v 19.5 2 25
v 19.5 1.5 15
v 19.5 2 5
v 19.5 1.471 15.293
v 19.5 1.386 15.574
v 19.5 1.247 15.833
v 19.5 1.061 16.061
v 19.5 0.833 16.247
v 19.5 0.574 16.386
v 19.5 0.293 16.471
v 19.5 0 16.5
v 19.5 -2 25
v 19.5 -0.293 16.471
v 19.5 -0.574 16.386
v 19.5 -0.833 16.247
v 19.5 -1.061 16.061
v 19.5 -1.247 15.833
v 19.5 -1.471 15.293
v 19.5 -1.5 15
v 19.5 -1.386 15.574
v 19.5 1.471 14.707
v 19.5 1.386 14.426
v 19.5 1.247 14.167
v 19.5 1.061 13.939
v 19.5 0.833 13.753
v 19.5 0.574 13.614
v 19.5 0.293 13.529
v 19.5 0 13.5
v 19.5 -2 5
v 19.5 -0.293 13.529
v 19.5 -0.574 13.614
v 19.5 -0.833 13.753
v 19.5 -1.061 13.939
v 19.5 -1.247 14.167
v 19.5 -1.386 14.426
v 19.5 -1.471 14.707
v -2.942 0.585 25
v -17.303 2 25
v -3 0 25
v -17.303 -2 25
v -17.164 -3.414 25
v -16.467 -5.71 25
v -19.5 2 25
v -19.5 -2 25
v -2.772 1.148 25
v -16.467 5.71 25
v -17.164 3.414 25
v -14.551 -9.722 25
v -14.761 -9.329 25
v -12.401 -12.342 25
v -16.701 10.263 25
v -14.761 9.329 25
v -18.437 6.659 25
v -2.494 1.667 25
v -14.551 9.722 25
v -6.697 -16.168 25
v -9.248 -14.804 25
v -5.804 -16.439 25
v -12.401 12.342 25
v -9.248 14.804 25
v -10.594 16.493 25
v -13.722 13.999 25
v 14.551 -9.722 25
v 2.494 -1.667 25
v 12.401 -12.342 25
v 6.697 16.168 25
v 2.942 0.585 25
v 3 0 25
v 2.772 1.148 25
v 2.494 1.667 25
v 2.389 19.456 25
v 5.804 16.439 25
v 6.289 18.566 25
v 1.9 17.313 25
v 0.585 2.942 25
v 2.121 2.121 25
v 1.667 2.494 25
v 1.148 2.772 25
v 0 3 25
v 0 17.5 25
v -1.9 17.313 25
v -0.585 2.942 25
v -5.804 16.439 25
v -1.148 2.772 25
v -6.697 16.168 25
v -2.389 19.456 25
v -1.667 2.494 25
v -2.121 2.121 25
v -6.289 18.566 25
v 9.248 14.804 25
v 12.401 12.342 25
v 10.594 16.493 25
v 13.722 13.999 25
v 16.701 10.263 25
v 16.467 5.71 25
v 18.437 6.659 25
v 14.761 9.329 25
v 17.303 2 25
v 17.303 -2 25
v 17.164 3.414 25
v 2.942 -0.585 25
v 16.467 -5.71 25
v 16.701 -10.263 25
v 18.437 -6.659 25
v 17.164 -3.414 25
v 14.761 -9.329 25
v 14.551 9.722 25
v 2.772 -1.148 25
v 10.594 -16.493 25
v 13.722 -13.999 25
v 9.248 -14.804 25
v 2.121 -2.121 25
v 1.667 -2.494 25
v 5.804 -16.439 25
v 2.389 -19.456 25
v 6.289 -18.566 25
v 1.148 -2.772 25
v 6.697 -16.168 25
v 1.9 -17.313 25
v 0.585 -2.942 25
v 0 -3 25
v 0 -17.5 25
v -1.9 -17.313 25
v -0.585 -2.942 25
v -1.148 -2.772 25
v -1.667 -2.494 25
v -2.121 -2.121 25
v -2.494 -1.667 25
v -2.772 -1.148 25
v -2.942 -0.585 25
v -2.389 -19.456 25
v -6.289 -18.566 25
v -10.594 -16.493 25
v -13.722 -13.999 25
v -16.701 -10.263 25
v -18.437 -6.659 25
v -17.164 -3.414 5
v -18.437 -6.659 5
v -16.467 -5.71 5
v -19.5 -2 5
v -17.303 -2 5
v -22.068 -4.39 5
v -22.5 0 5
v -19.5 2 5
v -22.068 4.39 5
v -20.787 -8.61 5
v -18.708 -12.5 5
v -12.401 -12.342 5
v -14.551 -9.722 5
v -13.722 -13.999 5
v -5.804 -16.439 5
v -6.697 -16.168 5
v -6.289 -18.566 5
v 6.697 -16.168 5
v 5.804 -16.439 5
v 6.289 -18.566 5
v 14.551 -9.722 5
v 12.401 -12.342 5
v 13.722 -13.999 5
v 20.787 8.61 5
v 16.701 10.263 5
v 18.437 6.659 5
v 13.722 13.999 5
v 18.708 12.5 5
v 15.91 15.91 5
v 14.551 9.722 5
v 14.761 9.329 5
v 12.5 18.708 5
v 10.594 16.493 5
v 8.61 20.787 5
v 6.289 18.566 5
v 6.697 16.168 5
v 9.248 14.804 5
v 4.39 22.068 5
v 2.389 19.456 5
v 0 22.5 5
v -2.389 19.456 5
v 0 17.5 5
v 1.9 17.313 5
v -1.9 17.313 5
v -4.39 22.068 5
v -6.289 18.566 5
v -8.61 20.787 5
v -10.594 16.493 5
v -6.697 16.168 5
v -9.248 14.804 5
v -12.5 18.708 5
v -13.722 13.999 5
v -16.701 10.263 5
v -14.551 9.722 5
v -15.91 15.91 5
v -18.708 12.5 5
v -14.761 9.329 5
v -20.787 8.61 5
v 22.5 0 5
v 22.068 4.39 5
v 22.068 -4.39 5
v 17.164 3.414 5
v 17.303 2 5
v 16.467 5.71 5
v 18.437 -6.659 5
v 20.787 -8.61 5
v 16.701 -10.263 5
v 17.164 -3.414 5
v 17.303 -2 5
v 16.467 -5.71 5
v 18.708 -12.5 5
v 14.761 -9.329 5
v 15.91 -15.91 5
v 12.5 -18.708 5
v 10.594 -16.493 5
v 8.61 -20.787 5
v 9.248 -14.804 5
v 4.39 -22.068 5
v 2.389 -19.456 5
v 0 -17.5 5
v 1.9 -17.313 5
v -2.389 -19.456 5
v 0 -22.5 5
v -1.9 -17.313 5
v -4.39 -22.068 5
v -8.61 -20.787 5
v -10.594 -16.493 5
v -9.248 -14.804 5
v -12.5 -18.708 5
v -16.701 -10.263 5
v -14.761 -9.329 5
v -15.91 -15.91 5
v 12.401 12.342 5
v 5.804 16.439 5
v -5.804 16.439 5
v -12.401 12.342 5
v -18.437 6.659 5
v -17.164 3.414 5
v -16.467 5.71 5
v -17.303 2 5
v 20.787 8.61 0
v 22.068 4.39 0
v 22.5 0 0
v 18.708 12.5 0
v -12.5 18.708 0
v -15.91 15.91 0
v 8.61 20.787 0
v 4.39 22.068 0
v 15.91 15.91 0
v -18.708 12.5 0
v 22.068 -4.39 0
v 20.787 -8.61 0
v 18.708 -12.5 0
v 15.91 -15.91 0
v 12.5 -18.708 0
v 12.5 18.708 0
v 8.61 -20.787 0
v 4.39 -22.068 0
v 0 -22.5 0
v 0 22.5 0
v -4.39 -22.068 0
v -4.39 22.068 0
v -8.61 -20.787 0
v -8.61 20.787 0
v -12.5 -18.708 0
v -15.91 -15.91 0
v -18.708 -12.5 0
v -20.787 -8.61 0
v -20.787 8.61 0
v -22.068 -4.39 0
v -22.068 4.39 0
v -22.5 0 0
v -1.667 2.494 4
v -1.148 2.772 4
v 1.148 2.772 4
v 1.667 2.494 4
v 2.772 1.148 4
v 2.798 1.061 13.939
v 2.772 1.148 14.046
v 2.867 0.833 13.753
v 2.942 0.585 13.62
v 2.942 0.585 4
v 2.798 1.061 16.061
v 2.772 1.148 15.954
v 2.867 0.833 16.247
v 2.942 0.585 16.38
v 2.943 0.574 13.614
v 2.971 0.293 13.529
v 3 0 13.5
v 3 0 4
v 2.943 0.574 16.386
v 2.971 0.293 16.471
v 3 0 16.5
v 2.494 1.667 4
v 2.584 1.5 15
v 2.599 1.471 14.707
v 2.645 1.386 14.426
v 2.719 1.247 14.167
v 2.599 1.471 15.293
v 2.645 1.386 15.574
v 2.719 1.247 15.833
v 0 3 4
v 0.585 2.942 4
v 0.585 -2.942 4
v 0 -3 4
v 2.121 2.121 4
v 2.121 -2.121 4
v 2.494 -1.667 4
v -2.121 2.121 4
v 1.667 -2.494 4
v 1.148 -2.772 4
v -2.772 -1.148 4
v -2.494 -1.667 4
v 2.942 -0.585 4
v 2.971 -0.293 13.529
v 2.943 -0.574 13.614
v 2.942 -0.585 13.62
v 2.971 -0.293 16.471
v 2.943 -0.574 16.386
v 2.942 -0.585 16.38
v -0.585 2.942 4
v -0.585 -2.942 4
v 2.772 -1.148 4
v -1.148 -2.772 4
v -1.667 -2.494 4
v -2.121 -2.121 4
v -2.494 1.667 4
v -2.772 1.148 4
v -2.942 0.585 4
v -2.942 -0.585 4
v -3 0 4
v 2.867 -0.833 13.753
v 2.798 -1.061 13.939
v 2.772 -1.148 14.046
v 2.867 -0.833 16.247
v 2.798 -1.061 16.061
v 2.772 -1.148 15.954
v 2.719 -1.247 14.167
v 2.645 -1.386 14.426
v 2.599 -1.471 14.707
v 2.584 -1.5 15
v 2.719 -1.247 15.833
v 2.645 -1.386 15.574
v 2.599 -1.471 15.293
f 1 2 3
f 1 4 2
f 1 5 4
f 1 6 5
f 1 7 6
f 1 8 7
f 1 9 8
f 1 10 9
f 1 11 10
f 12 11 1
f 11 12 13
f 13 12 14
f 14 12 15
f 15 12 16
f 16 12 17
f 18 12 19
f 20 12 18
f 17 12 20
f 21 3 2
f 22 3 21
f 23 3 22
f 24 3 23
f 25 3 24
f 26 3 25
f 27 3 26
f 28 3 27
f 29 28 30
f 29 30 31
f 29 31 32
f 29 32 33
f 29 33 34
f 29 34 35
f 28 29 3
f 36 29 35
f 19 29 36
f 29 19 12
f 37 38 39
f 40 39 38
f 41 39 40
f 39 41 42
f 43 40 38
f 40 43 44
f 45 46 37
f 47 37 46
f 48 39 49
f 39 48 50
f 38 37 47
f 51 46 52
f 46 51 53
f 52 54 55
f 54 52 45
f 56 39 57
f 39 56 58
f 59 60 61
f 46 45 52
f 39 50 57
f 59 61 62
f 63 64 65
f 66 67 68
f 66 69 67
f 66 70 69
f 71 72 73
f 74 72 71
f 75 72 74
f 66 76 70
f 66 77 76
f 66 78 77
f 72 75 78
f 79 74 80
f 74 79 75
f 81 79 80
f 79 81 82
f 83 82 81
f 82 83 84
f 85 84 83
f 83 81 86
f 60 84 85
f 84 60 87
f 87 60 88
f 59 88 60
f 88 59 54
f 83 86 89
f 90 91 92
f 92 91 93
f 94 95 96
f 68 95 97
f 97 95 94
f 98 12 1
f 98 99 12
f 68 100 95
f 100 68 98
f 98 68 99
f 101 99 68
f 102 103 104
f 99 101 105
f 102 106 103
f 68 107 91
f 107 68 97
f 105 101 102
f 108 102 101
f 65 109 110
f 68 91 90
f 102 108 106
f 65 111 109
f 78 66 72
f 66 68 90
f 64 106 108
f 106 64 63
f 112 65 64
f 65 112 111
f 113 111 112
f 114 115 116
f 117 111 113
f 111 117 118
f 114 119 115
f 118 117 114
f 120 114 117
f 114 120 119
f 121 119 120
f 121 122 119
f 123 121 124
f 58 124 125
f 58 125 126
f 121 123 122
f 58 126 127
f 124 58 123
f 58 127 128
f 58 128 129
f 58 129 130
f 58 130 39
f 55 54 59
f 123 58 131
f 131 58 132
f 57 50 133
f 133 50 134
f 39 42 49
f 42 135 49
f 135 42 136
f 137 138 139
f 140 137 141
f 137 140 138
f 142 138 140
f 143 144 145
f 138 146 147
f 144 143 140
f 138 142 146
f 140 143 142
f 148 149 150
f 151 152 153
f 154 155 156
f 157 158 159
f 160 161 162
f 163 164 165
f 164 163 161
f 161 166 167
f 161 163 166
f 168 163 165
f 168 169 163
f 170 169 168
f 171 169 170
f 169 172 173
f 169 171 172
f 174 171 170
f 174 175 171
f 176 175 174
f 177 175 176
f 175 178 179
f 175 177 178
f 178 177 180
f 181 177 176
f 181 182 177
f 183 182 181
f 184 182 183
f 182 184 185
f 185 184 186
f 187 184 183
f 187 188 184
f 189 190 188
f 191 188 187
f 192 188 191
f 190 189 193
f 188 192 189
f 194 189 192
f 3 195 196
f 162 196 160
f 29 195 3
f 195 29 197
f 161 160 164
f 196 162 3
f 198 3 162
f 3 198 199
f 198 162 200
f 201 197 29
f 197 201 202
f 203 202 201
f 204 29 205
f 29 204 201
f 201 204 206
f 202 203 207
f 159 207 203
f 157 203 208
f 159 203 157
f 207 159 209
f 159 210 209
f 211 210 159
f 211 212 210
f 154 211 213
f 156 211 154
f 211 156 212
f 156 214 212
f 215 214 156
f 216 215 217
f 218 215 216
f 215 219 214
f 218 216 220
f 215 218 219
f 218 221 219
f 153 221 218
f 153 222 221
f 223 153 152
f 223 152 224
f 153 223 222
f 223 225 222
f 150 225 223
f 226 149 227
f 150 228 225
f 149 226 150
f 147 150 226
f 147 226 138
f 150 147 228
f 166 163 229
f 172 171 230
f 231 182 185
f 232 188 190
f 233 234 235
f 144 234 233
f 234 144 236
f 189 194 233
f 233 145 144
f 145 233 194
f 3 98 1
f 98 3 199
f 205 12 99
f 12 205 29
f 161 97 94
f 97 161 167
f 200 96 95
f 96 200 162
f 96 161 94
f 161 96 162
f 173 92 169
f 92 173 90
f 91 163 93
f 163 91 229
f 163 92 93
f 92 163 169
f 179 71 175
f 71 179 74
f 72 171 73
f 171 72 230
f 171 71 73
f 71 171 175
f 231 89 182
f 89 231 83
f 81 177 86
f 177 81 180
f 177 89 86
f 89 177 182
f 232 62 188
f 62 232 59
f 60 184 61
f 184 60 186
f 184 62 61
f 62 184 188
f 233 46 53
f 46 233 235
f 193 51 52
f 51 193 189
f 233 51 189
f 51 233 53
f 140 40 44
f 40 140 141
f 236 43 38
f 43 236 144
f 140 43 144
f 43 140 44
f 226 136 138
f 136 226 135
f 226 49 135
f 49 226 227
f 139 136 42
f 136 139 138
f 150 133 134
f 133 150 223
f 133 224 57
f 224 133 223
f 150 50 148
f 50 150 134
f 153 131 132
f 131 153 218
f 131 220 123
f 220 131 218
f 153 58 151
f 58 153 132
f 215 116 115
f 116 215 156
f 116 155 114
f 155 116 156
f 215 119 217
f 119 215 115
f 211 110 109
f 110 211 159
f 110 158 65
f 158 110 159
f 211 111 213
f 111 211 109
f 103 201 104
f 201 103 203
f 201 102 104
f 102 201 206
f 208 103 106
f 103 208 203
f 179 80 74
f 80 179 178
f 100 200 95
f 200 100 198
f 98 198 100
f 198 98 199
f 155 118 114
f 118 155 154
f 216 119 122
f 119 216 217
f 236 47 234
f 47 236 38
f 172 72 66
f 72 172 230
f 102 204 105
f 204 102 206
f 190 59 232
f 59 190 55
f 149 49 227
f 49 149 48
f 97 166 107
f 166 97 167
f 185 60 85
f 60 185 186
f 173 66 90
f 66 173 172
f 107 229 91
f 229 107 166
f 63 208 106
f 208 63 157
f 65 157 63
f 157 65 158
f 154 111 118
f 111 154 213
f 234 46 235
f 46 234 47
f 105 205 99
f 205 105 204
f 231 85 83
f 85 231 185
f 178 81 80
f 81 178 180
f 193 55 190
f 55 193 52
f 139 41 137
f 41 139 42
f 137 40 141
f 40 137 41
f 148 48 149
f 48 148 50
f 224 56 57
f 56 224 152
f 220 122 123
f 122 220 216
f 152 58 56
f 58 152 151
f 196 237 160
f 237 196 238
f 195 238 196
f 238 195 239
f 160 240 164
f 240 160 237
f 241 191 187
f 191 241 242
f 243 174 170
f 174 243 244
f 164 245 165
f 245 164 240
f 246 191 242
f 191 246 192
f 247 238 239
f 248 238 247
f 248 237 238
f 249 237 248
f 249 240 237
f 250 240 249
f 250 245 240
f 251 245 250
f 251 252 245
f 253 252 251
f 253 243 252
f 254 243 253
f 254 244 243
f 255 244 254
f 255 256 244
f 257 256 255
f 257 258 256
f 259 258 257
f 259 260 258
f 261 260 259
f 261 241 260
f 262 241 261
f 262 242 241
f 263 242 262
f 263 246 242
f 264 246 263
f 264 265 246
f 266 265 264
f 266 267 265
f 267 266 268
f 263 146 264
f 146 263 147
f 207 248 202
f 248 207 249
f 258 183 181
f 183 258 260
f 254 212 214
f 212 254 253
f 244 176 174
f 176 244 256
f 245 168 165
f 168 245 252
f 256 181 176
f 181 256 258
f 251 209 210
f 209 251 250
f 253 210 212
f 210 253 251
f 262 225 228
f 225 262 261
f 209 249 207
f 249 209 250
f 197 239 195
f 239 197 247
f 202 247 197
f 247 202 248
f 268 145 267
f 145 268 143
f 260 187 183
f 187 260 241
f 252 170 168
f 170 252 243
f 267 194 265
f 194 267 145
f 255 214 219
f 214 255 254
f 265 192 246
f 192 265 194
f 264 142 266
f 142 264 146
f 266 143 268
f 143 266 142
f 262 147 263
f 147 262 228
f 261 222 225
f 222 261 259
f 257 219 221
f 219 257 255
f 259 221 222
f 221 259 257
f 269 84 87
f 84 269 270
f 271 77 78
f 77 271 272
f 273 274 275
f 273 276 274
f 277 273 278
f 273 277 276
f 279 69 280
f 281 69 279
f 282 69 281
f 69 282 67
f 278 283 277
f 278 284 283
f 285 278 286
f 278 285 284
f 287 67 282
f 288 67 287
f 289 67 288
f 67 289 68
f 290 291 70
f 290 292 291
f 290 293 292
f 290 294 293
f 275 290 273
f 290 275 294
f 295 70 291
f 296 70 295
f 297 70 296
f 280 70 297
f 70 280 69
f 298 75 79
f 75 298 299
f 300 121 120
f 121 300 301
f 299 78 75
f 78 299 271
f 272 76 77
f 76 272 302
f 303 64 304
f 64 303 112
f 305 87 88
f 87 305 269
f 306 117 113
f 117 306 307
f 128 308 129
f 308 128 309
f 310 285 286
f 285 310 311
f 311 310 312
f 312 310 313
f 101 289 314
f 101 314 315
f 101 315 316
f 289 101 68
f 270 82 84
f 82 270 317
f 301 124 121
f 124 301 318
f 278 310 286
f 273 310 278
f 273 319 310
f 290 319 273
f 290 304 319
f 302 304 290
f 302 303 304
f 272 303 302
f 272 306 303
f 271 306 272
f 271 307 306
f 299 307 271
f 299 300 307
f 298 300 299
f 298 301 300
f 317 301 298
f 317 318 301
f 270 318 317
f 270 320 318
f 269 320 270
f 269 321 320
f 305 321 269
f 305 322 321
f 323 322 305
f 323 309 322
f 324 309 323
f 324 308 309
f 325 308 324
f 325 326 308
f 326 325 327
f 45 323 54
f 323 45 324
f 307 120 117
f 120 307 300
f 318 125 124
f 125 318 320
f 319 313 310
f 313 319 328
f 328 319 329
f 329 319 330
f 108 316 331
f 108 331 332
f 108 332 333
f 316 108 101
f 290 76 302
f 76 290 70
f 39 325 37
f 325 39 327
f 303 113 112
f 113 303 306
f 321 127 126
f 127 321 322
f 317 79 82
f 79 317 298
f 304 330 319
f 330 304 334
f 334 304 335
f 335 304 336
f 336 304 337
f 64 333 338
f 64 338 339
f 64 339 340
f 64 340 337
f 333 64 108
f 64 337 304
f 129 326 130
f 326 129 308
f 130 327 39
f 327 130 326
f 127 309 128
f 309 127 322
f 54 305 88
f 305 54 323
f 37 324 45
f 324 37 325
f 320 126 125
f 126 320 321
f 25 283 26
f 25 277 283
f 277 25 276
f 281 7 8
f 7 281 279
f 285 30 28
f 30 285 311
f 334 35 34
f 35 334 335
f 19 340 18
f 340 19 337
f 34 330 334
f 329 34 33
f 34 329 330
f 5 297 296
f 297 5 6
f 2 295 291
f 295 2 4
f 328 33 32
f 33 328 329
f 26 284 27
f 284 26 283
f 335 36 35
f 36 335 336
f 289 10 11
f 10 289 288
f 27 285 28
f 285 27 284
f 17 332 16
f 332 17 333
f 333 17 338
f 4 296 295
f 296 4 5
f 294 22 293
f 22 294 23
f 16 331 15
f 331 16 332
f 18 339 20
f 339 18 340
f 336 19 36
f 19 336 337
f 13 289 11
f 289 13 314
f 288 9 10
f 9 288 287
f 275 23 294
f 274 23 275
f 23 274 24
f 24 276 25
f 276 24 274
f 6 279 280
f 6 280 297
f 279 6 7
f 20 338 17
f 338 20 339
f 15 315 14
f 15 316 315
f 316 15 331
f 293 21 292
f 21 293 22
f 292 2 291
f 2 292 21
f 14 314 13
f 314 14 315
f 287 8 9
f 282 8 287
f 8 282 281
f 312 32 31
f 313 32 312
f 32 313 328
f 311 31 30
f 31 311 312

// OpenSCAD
$fn = 32;

// ----------------------------------------------------------------------
// Control knob: skirt knob with grip ribs
// ----------------------------------------------------------------------

// --- parameters (mm) ---
skirt_d = 45;             // skirt diameter
skirt_t = 5;              // skirt thickness
rib_w = 4;                // grip rib width
rib_out = 3;              // grip rib radial protrusion
n_ribs = 14;              // number of grip ribs
knob_d = 35;              // knob body diameter
knob_h = 20;              // knob body height
bore_d = 6;               // shaft bore diameter
set_d = 3;                // set screw bore diameter

rib_step = 360 / n_ribs;  // rib angular step
total_h = skirt_t + knob_h;  // overall height

difference() {
  union() {
    translate([0, 0, skirt_t]) cylinder(h = knob_h, d = knob_d);
    cylinder(h = skirt_t, d = skirt_d);
    for (i = [0 : n_ribs - 1])
      rotate([0, 0, i * rib_step])
        translate([knob_d / 2 - 1, -rib_w / 2, skirt_t])
          cube([rib_out, rib_w, knob_h]);
  }
  translate([0, 0, skirt_t - 1]) cylinder(h = knob_h + 2, d = bore_d);
  translate([-1, 0, skirt_t + knob_h / 2]) rotate([0, 90, 0])
    cylinder(h = knob_d / 2 + bore_d / 2 + 2, d = set_d);
}
